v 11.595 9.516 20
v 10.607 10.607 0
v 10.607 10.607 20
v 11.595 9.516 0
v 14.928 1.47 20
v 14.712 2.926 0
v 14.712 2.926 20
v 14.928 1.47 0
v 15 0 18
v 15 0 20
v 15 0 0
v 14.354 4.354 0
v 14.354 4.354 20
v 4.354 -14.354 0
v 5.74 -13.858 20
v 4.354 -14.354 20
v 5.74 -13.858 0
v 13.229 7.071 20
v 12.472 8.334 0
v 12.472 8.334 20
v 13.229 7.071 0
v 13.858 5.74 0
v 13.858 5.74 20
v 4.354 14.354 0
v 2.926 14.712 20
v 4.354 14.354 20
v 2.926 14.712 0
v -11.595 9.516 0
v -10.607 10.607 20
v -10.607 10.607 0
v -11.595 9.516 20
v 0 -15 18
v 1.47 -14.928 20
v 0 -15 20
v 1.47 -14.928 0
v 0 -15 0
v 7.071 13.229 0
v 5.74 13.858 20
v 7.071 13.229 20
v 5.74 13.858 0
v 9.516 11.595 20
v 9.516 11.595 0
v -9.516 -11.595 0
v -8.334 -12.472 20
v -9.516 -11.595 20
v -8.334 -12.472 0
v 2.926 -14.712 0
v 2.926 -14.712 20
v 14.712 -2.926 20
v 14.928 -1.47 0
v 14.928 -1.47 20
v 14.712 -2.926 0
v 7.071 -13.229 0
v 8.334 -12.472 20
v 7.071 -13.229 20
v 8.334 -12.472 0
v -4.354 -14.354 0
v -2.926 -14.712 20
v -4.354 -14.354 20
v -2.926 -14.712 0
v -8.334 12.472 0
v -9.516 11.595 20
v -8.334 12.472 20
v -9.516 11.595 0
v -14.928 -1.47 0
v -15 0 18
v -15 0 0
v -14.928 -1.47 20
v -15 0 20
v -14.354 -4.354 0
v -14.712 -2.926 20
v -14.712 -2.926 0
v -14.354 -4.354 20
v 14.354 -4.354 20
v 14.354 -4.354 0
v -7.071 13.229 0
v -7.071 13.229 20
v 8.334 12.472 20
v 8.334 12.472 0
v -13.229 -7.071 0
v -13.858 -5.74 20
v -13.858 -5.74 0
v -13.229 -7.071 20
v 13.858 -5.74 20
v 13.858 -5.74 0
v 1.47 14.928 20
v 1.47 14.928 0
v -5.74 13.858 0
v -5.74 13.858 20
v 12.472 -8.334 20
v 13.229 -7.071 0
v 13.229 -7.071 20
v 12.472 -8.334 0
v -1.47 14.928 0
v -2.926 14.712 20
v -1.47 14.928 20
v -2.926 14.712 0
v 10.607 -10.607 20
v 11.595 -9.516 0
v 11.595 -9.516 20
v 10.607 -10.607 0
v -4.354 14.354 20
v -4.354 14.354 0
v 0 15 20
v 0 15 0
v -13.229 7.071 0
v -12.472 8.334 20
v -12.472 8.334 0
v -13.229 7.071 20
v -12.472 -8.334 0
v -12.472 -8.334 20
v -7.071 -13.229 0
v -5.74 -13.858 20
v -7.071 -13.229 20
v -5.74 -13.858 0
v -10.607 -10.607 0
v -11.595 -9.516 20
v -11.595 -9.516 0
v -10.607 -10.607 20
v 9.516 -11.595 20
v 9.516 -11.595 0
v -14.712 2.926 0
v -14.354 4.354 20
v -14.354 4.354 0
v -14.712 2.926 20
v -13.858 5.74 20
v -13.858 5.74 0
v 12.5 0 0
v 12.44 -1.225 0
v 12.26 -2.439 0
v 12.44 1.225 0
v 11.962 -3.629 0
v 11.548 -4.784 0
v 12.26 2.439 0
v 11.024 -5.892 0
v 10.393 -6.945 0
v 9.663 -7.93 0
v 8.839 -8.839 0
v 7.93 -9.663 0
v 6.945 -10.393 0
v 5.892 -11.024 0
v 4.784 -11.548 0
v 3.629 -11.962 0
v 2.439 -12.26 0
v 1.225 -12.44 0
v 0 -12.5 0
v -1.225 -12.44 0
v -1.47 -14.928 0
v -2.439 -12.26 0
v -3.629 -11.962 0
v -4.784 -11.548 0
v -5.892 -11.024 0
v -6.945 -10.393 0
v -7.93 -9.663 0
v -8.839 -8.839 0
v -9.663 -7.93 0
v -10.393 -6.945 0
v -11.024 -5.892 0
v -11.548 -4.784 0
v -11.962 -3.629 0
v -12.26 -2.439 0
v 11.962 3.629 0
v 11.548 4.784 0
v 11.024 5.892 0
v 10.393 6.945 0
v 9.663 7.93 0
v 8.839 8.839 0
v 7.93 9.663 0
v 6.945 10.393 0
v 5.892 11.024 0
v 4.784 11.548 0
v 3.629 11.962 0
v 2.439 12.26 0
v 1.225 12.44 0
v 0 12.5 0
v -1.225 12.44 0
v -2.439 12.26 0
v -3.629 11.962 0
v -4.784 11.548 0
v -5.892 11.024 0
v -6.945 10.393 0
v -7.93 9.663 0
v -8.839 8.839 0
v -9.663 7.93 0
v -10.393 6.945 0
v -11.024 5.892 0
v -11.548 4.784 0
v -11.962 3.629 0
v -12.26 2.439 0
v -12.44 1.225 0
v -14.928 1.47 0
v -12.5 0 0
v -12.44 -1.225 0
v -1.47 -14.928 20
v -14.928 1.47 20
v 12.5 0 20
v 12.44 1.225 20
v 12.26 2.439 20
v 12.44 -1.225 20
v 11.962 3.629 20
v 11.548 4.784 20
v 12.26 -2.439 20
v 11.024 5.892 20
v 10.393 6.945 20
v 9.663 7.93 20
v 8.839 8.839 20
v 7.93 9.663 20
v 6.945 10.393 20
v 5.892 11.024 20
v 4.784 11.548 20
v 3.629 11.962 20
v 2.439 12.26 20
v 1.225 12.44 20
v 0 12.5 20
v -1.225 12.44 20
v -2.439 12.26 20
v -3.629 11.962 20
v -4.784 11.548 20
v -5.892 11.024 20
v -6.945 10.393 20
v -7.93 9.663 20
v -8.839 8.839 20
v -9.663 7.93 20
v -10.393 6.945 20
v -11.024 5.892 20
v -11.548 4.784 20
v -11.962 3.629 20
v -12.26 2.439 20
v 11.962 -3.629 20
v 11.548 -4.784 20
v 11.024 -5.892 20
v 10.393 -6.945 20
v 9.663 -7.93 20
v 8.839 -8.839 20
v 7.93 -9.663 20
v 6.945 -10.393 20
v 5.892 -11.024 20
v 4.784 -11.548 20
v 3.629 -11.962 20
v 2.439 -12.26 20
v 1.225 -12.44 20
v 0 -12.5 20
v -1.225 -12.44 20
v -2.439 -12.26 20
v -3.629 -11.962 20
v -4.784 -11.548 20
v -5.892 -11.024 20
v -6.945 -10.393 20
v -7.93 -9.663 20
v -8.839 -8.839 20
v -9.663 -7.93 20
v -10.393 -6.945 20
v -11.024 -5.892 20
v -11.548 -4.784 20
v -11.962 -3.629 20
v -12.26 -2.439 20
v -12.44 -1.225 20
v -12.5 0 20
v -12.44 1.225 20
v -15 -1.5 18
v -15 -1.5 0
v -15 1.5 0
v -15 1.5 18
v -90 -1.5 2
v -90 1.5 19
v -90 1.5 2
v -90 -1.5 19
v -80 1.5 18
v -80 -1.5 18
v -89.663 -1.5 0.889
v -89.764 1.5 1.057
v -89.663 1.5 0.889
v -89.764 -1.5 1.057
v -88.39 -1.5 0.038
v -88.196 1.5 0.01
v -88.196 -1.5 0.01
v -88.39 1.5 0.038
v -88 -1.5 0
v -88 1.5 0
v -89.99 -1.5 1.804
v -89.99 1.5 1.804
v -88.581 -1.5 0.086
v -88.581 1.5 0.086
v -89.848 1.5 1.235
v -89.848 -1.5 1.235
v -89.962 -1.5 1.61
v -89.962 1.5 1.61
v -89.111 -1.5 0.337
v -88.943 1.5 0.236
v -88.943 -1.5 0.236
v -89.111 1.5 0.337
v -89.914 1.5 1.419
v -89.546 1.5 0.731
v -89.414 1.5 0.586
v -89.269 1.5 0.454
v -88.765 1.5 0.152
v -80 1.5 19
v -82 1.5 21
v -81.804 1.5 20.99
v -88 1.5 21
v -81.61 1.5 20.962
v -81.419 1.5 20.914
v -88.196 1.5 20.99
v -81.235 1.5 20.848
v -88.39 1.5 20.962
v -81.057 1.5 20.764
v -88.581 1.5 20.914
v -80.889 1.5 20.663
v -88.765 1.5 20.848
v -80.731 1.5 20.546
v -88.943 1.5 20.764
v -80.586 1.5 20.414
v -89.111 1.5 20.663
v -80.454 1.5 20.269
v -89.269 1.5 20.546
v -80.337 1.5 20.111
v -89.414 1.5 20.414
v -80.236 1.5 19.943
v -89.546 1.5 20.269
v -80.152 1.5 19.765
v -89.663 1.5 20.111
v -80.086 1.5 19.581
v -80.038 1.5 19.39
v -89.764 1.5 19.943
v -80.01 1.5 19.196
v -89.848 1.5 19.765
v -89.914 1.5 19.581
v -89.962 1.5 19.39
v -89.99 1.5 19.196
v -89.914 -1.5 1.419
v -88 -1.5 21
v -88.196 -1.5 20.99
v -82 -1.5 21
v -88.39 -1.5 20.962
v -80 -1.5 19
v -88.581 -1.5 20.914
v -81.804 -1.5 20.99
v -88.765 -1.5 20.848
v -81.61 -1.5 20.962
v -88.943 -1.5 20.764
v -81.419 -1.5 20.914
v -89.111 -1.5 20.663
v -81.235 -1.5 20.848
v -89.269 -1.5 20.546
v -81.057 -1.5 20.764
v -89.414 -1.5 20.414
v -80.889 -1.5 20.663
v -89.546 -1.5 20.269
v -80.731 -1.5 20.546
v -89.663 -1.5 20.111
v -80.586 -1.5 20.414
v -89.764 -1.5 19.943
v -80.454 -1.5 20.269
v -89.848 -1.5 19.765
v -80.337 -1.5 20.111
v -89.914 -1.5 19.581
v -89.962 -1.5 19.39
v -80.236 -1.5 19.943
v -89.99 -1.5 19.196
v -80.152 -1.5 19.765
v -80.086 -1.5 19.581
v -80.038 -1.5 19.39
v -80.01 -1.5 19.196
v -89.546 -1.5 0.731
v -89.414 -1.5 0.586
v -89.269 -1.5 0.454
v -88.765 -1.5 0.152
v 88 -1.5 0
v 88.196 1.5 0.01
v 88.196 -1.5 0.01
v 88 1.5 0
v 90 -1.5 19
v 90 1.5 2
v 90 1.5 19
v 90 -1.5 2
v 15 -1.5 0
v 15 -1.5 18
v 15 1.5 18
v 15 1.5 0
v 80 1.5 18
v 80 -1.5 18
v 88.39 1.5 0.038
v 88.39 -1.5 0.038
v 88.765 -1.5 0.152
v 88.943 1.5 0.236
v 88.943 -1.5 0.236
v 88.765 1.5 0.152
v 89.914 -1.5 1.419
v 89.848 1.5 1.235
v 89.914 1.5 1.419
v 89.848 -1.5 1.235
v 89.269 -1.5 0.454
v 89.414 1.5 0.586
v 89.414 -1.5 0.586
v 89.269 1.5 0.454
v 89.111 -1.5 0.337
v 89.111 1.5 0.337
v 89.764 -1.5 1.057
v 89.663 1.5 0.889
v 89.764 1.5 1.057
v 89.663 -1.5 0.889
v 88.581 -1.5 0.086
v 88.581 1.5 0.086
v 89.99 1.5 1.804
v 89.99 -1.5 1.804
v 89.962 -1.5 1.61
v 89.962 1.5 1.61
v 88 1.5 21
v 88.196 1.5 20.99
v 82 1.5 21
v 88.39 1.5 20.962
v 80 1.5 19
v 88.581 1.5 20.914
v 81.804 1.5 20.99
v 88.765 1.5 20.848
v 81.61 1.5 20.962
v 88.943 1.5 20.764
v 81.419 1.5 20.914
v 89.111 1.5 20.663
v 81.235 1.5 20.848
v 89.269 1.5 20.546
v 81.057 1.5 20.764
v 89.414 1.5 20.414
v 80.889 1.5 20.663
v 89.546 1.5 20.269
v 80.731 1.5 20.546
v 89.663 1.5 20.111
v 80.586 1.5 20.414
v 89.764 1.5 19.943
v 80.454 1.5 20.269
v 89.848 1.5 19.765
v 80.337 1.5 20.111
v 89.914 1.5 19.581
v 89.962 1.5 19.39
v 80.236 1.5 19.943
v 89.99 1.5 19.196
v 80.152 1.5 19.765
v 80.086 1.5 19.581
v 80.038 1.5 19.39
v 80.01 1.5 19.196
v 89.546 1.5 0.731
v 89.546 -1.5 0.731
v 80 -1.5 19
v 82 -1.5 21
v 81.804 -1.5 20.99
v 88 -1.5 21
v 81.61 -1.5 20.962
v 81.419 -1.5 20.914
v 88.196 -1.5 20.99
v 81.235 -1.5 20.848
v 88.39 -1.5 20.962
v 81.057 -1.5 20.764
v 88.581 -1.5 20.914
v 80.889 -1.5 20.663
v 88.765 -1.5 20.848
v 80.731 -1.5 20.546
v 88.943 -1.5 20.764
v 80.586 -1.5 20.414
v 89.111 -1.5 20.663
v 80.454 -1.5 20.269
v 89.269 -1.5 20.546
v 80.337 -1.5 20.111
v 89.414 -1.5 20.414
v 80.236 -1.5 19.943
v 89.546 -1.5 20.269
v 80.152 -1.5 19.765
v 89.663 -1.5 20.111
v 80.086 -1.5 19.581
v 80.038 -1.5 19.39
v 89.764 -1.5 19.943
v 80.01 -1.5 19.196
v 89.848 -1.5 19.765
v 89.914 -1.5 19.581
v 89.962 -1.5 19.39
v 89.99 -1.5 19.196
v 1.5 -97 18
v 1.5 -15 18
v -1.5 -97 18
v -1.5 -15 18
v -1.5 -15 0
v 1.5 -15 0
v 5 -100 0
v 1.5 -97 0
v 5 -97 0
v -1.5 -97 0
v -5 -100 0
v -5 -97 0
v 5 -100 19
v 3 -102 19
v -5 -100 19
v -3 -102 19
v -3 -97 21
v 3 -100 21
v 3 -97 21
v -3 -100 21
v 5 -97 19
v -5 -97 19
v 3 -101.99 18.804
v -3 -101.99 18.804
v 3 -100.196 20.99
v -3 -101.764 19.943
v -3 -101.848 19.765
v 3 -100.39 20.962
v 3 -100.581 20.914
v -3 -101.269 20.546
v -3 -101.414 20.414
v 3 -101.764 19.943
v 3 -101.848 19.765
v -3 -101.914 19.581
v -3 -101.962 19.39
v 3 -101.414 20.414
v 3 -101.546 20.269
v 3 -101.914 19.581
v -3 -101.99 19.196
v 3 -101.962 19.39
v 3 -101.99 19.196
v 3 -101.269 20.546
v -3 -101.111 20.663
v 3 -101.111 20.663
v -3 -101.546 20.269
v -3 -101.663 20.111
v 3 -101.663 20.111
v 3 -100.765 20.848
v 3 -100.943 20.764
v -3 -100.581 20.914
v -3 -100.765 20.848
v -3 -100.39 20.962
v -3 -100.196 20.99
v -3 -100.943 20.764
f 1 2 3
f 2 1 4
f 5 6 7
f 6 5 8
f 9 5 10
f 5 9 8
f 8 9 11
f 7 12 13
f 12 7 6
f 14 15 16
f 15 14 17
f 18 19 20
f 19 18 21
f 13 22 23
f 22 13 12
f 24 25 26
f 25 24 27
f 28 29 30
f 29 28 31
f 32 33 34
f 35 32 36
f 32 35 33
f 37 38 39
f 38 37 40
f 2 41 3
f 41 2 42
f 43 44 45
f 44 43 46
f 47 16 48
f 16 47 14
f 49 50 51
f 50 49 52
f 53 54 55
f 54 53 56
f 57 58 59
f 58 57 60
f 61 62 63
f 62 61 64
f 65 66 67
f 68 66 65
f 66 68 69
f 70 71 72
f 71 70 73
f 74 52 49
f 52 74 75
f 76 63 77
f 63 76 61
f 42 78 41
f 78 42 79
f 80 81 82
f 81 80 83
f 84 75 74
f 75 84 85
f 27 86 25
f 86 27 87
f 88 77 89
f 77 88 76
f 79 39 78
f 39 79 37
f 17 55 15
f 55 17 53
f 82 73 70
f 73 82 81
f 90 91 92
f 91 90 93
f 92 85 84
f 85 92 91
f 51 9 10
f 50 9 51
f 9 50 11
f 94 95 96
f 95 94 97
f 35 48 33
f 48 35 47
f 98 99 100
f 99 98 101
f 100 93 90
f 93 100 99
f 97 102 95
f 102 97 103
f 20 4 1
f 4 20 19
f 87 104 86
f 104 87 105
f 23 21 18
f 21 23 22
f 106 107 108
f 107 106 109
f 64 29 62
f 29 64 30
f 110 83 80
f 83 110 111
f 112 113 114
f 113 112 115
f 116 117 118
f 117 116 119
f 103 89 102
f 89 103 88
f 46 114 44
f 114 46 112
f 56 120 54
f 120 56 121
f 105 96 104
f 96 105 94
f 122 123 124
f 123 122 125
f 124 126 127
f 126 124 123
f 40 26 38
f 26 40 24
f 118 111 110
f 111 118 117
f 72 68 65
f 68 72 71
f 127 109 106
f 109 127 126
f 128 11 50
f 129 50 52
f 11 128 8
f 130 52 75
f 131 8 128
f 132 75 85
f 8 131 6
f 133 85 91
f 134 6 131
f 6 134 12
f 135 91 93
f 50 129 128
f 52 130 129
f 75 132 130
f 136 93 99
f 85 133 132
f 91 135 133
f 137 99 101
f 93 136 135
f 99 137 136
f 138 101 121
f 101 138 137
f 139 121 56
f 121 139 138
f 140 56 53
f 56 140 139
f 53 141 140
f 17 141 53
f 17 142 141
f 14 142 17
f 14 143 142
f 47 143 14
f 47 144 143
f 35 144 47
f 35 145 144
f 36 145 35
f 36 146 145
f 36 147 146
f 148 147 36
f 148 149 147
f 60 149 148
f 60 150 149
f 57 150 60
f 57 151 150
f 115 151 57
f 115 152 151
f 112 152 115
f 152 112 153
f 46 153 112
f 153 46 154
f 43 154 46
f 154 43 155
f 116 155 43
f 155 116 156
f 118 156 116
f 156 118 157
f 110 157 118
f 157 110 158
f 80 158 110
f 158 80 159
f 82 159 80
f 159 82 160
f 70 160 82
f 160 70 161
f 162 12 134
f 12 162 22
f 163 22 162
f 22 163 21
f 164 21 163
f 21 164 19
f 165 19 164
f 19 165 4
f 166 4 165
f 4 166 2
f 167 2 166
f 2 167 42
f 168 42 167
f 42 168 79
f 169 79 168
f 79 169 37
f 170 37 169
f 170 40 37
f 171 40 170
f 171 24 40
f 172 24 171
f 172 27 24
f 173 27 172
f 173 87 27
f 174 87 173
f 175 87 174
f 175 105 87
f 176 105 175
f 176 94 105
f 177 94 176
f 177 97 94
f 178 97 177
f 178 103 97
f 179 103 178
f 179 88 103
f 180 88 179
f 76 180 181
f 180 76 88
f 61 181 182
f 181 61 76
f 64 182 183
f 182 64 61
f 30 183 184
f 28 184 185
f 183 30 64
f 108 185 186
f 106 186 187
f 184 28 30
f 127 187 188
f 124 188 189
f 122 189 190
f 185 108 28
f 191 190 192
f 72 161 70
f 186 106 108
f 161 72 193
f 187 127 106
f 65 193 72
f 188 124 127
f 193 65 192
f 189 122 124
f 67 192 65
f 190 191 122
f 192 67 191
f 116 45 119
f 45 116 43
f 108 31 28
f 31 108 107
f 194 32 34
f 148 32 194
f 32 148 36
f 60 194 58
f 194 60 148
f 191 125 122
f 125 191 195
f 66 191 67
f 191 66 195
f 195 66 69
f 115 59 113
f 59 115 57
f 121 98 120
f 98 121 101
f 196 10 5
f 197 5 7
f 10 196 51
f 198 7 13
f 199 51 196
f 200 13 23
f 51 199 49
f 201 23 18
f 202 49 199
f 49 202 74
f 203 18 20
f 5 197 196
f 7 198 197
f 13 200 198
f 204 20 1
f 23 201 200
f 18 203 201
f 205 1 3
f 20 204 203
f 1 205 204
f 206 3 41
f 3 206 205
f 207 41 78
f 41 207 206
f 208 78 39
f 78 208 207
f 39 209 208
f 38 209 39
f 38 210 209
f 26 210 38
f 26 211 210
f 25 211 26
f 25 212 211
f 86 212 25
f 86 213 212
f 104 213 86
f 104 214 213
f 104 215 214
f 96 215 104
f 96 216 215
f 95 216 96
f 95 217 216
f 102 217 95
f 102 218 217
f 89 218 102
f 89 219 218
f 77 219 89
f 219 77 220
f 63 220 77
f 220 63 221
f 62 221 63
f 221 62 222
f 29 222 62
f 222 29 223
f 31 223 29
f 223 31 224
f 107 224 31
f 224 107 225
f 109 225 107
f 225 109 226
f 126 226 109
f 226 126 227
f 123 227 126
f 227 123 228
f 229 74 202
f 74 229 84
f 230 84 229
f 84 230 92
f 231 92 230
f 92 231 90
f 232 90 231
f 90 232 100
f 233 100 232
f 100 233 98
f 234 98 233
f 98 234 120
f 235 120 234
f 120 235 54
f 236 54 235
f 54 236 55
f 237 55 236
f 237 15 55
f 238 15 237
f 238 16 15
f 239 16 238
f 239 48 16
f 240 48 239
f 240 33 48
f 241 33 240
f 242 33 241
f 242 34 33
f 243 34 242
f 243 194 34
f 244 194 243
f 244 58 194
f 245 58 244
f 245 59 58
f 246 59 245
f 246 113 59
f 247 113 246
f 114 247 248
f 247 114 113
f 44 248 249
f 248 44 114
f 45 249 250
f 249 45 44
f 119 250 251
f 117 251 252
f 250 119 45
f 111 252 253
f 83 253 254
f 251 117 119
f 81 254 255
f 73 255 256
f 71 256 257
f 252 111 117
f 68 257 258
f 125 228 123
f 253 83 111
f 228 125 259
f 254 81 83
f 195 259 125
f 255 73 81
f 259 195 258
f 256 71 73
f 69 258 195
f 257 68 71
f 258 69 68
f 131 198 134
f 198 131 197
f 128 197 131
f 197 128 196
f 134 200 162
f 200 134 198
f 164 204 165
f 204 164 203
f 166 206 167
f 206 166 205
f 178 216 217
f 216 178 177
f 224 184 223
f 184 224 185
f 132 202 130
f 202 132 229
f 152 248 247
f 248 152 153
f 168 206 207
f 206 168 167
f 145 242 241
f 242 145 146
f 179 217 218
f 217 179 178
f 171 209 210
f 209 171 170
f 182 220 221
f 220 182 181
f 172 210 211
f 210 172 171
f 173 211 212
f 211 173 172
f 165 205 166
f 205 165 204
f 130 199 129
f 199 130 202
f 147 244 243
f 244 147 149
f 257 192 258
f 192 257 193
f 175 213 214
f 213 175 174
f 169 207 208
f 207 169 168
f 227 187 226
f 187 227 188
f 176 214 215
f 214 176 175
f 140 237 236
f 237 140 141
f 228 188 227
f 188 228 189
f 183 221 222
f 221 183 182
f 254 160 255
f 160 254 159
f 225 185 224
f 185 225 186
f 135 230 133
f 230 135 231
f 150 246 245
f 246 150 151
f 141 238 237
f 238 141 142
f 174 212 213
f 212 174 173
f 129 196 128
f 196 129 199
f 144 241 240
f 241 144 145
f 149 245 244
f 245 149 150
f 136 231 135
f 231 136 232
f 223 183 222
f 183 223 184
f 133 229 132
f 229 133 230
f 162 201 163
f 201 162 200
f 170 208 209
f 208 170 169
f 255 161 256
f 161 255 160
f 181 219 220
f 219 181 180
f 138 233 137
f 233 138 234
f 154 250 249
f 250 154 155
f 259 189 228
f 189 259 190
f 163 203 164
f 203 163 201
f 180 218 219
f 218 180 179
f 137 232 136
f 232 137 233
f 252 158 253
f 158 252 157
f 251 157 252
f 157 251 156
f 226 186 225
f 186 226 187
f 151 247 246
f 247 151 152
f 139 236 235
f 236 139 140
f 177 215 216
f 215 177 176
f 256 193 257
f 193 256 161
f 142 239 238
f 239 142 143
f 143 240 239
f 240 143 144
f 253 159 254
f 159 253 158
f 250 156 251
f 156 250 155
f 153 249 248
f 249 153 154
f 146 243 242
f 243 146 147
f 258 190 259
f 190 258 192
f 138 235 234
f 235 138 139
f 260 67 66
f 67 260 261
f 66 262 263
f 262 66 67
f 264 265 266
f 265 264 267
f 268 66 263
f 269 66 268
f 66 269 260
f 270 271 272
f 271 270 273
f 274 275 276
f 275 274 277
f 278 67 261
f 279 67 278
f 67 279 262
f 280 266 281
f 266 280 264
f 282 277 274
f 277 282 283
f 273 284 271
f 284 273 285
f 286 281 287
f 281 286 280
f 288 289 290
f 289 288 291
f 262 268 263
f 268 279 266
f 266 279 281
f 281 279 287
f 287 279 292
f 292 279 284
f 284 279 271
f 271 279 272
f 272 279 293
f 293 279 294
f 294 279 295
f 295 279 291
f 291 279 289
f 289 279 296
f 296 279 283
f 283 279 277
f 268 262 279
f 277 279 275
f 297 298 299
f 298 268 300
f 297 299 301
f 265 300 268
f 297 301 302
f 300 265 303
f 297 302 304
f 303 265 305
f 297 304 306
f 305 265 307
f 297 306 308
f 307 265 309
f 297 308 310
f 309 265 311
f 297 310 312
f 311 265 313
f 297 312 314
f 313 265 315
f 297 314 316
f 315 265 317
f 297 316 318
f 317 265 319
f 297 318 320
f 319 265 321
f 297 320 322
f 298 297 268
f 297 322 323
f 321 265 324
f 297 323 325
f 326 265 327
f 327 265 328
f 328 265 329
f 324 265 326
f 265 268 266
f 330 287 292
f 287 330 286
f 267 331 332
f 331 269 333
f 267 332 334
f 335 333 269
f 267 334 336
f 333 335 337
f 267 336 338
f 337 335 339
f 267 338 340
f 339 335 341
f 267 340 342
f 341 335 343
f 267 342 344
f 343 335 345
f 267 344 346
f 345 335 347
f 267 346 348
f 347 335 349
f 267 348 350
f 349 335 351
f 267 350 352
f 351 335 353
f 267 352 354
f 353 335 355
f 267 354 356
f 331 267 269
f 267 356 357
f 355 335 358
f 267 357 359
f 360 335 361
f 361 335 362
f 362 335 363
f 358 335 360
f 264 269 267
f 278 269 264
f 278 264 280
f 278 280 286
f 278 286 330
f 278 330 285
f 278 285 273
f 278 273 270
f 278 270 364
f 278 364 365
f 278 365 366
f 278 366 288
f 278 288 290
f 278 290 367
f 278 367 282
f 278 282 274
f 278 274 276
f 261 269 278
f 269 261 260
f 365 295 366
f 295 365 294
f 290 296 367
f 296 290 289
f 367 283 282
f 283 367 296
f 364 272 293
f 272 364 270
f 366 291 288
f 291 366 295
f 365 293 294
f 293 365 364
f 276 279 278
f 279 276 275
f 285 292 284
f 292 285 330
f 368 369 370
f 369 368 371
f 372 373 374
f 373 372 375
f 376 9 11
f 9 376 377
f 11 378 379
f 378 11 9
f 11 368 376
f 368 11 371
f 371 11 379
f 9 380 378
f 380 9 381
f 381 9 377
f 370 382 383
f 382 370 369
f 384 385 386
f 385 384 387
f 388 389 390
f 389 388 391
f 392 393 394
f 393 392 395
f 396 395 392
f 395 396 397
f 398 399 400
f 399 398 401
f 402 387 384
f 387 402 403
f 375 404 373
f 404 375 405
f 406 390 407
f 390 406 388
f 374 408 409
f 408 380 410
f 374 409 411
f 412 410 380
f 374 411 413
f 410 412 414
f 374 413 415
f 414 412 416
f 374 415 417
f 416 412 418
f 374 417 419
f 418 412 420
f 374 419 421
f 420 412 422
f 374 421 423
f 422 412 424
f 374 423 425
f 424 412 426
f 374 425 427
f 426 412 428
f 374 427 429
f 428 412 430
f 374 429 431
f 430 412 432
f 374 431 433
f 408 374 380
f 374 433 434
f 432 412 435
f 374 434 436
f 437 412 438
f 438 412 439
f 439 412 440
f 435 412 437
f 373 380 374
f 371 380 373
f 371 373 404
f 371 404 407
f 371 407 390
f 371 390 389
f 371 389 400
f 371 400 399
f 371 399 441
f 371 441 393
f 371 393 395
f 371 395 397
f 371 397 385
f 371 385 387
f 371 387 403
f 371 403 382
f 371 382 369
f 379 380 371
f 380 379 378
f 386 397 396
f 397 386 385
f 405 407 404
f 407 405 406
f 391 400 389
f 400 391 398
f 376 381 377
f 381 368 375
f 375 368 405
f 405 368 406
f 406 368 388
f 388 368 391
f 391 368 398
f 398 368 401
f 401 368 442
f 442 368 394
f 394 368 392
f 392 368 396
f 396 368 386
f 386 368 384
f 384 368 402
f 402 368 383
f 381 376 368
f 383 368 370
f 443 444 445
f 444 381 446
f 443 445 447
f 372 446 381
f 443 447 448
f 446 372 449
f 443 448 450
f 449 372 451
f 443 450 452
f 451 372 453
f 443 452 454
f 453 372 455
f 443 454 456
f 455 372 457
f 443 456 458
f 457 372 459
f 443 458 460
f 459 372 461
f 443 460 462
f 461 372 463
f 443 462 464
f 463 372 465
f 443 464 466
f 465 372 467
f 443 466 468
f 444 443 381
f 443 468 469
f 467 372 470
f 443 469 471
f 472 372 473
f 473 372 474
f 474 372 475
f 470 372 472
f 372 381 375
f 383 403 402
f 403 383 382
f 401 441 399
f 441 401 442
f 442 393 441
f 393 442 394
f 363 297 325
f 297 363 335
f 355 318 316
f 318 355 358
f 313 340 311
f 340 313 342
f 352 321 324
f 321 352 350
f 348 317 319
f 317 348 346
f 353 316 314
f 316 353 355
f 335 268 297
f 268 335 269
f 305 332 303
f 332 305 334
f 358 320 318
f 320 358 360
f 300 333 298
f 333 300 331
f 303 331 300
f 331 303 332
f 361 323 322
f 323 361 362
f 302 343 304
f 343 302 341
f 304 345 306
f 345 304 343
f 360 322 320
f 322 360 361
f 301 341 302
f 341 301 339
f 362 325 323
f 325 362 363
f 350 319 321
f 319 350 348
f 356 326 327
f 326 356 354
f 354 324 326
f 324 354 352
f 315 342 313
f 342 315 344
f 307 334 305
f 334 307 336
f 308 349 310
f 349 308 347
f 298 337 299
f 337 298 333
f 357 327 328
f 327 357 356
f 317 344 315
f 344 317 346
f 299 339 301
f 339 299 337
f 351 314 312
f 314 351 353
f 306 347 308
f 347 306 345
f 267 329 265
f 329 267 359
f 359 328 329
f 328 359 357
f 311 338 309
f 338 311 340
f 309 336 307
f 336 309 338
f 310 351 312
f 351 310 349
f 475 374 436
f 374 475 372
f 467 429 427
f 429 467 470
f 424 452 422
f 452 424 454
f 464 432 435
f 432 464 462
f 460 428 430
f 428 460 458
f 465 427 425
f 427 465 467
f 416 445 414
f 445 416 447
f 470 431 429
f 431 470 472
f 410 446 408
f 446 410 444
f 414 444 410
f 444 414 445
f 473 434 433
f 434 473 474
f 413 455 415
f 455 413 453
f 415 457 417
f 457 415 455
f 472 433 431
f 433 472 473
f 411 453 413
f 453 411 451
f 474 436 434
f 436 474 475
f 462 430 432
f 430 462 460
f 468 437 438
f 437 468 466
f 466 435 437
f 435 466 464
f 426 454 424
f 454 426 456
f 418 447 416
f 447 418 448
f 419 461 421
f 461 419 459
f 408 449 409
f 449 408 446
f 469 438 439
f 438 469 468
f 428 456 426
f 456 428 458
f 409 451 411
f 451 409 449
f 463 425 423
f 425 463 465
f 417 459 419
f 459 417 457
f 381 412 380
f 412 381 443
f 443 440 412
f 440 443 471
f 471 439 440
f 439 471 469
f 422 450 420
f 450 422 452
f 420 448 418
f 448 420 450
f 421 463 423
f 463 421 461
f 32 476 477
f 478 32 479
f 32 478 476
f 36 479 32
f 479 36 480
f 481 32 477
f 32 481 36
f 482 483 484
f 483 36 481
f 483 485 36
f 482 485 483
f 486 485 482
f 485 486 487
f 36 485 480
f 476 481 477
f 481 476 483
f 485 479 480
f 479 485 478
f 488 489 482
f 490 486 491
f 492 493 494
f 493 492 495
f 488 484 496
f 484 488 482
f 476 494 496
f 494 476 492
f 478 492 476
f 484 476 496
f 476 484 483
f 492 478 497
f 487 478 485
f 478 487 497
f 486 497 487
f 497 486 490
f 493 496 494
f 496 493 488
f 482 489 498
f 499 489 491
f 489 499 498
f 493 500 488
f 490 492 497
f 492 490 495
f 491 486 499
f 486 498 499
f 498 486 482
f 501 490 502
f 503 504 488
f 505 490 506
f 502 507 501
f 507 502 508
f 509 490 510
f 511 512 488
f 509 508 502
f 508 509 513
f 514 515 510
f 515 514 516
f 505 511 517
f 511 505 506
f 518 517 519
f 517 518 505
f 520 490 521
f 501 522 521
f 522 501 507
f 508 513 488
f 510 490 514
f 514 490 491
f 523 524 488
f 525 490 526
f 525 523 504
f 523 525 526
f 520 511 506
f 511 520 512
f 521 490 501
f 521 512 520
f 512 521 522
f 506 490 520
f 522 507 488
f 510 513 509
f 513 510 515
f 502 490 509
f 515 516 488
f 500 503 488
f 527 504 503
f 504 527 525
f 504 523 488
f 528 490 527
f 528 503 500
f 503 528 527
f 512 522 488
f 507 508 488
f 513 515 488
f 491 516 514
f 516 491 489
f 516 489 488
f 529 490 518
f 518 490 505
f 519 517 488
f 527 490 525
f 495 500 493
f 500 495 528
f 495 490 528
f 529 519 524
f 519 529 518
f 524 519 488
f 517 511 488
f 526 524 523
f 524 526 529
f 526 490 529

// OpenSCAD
// ============================================================
// Glasses holder
// Clips onto wooden rod, holds 2 pairs of glasses
// T-shape: 2 short arms + 1 long perpendicular arm
// ============================================================
$fn = 64;

// --- Rod ---
rod_diameter = 24;
rod_clearance = 0.5;

// --- Collar ---
collar_height = 20;
collar_wall = 3;
collar_r = rod_diameter/2 + collar_wall;

// --- Arms ---
arm_total_length = 180;
arm_width = 3;
arm_thickness_center = 18;
arm_thickness_tip = 10;
lip_height = 3;

// --- Perpendicular arm ---
perp_arm_length = 100;

// --- Rounding ---
corner_r = 2;

union() {
    // Collar
    difference() {
        cylinder(h = collar_height, r = collar_r);
        translate([0, 0, -1])
            cylinder(h = collar_height + 2, r = rod_diameter/2 + rod_clearance);
    }

    // Left arm with rounded bottom-left corner
    hull() {
        translate([-arm_total_length/2 + corner_r, -arm_width/2, 0])
            cube([arm_total_length/2 - collar_r - corner_r, arm_width, arm_thickness_center]);
        translate([-arm_total_length/2, -arm_width/2, corner_r])
            cube([arm_total_length/2 - collar_r, arm_width, arm_thickness_center - corner_r]);
        translate([-arm_total_length/2 + corner_r, -arm_width/2, corner_r])
            rotate([-90, 0, 0])
                cylinder(r = corner_r, h = arm_width);
    }

    // Right arm with rounded bottom-right corner
    hull() {
        translate([collar_r, -arm_width/2, 0])
            cube([arm_total_length/2 - collar_r - corner_r, arm_width, arm_thickness_center]);
        translate([collar_r, -arm_width/2, corner_r])
            cube([arm_total_length/2 - collar_r, arm_width, arm_thickness_center - corner_r]);
        translate([arm_total_length/2 - corner_r, -arm_width/2, corner_r])
            rotate([-90, 0, 0])
                cylinder(r = corner_r, h = arm_width);
    }

    // Left lip with rounded top corners
    hull() {
        translate([-arm_total_length/2, -arm_width/2, arm_thickness_center])
            cube([arm_thickness_tip, arm_width, lip_height - corner_r]);
        translate([-arm_total_length/2 + corner_r, -arm_width/2, arm_thickness_center])
            cube([arm_thickness_tip - corner_r*2, arm_width, lip_height]);
        translate([-arm_total_length/2 + corner_r, -arm_width/2, arm_thickness_center + lip_height - corner_r])
            rotate([-90, 0, 0])
                cylinder(r = corner_r, h = arm_width);
        translate([-arm_total_length/2 + arm_thickness_tip - corner_r, -arm_width/2, arm_thickness_center + lip_height - corner_r])
            rotate([-90, 0, 0])
                cylinder(r = corner_r, h = arm_width);
    }

    // Right lip with rounded top corners
    hull() {
        translate([arm_total_length/2 - arm_thickness_tip, -arm_width/2, arm_thickness_center])
            cube([arm_thickness_tip, arm_width, lip_height - corner_r]);
        translate([arm_total_length/2 - arm_thickness_tip + corner_r, -arm_width/2, arm_thickness_center])
            cube([arm_thickness_tip - corner_r*2, arm_width, lip_height]);
        translate([arm_total_length/2 - arm_thickness_tip + corner_r, -arm_width/2, arm_thickness_center + lip_height - corner_r])
            rotate([-90, 0, 0])
                cylinder(r = corner_r, h = arm_width);
        translate([arm_total_length/2 - corner_r, -arm_width/2, arm_thickness_center + lip_height - corner_r])
            rotate([-90, 0, 0])
                cylinder(r = corner_r, h = arm_width);
    }

    // Perpendicular arm with rounded bottom corner
    hull() {
        translate([-arm_width/2, -perp_arm_length + corner_r, 0])
            cube([arm_width, perp_arm_length - collar_r - corner_r, arm_thickness_center]);
        translate([-arm_width/2, -perp_arm_length, corner_r])
            cube([arm_width, perp_arm_length - collar_r, arm_thickness_center - corner_r]);
        translate([-arm_width/2, -perp_arm_length + corner_r, corner_r])
            rotate([0, 90, 0])
                cylinder(r = corner_r, h = arm_width);
    }

    // Perpendicular lip with rounded top corners
    hull() {
        translate([-arm_thickness_tip/2, -perp_arm_length, 0])
            cube([arm_thickness_tip, arm_width, arm_thickness_center + lip_height - corner_r]);
        translate([-arm_thickness_tip/2 + corner_r, -perp_arm_length, 0])
            cube([arm_thickness_tip - corner_r*2, arm_width, arm_thickness_center + lip_height]);
        translate([-arm_thickness_tip/2 + corner_r, -perp_arm_length, arm_thickness_center + lip_height - corner_r])
            rotate([0, 90, 0])
                cylinder(r = corner_r, h = arm_thickness_tip - corner_r*2);
    }
}
